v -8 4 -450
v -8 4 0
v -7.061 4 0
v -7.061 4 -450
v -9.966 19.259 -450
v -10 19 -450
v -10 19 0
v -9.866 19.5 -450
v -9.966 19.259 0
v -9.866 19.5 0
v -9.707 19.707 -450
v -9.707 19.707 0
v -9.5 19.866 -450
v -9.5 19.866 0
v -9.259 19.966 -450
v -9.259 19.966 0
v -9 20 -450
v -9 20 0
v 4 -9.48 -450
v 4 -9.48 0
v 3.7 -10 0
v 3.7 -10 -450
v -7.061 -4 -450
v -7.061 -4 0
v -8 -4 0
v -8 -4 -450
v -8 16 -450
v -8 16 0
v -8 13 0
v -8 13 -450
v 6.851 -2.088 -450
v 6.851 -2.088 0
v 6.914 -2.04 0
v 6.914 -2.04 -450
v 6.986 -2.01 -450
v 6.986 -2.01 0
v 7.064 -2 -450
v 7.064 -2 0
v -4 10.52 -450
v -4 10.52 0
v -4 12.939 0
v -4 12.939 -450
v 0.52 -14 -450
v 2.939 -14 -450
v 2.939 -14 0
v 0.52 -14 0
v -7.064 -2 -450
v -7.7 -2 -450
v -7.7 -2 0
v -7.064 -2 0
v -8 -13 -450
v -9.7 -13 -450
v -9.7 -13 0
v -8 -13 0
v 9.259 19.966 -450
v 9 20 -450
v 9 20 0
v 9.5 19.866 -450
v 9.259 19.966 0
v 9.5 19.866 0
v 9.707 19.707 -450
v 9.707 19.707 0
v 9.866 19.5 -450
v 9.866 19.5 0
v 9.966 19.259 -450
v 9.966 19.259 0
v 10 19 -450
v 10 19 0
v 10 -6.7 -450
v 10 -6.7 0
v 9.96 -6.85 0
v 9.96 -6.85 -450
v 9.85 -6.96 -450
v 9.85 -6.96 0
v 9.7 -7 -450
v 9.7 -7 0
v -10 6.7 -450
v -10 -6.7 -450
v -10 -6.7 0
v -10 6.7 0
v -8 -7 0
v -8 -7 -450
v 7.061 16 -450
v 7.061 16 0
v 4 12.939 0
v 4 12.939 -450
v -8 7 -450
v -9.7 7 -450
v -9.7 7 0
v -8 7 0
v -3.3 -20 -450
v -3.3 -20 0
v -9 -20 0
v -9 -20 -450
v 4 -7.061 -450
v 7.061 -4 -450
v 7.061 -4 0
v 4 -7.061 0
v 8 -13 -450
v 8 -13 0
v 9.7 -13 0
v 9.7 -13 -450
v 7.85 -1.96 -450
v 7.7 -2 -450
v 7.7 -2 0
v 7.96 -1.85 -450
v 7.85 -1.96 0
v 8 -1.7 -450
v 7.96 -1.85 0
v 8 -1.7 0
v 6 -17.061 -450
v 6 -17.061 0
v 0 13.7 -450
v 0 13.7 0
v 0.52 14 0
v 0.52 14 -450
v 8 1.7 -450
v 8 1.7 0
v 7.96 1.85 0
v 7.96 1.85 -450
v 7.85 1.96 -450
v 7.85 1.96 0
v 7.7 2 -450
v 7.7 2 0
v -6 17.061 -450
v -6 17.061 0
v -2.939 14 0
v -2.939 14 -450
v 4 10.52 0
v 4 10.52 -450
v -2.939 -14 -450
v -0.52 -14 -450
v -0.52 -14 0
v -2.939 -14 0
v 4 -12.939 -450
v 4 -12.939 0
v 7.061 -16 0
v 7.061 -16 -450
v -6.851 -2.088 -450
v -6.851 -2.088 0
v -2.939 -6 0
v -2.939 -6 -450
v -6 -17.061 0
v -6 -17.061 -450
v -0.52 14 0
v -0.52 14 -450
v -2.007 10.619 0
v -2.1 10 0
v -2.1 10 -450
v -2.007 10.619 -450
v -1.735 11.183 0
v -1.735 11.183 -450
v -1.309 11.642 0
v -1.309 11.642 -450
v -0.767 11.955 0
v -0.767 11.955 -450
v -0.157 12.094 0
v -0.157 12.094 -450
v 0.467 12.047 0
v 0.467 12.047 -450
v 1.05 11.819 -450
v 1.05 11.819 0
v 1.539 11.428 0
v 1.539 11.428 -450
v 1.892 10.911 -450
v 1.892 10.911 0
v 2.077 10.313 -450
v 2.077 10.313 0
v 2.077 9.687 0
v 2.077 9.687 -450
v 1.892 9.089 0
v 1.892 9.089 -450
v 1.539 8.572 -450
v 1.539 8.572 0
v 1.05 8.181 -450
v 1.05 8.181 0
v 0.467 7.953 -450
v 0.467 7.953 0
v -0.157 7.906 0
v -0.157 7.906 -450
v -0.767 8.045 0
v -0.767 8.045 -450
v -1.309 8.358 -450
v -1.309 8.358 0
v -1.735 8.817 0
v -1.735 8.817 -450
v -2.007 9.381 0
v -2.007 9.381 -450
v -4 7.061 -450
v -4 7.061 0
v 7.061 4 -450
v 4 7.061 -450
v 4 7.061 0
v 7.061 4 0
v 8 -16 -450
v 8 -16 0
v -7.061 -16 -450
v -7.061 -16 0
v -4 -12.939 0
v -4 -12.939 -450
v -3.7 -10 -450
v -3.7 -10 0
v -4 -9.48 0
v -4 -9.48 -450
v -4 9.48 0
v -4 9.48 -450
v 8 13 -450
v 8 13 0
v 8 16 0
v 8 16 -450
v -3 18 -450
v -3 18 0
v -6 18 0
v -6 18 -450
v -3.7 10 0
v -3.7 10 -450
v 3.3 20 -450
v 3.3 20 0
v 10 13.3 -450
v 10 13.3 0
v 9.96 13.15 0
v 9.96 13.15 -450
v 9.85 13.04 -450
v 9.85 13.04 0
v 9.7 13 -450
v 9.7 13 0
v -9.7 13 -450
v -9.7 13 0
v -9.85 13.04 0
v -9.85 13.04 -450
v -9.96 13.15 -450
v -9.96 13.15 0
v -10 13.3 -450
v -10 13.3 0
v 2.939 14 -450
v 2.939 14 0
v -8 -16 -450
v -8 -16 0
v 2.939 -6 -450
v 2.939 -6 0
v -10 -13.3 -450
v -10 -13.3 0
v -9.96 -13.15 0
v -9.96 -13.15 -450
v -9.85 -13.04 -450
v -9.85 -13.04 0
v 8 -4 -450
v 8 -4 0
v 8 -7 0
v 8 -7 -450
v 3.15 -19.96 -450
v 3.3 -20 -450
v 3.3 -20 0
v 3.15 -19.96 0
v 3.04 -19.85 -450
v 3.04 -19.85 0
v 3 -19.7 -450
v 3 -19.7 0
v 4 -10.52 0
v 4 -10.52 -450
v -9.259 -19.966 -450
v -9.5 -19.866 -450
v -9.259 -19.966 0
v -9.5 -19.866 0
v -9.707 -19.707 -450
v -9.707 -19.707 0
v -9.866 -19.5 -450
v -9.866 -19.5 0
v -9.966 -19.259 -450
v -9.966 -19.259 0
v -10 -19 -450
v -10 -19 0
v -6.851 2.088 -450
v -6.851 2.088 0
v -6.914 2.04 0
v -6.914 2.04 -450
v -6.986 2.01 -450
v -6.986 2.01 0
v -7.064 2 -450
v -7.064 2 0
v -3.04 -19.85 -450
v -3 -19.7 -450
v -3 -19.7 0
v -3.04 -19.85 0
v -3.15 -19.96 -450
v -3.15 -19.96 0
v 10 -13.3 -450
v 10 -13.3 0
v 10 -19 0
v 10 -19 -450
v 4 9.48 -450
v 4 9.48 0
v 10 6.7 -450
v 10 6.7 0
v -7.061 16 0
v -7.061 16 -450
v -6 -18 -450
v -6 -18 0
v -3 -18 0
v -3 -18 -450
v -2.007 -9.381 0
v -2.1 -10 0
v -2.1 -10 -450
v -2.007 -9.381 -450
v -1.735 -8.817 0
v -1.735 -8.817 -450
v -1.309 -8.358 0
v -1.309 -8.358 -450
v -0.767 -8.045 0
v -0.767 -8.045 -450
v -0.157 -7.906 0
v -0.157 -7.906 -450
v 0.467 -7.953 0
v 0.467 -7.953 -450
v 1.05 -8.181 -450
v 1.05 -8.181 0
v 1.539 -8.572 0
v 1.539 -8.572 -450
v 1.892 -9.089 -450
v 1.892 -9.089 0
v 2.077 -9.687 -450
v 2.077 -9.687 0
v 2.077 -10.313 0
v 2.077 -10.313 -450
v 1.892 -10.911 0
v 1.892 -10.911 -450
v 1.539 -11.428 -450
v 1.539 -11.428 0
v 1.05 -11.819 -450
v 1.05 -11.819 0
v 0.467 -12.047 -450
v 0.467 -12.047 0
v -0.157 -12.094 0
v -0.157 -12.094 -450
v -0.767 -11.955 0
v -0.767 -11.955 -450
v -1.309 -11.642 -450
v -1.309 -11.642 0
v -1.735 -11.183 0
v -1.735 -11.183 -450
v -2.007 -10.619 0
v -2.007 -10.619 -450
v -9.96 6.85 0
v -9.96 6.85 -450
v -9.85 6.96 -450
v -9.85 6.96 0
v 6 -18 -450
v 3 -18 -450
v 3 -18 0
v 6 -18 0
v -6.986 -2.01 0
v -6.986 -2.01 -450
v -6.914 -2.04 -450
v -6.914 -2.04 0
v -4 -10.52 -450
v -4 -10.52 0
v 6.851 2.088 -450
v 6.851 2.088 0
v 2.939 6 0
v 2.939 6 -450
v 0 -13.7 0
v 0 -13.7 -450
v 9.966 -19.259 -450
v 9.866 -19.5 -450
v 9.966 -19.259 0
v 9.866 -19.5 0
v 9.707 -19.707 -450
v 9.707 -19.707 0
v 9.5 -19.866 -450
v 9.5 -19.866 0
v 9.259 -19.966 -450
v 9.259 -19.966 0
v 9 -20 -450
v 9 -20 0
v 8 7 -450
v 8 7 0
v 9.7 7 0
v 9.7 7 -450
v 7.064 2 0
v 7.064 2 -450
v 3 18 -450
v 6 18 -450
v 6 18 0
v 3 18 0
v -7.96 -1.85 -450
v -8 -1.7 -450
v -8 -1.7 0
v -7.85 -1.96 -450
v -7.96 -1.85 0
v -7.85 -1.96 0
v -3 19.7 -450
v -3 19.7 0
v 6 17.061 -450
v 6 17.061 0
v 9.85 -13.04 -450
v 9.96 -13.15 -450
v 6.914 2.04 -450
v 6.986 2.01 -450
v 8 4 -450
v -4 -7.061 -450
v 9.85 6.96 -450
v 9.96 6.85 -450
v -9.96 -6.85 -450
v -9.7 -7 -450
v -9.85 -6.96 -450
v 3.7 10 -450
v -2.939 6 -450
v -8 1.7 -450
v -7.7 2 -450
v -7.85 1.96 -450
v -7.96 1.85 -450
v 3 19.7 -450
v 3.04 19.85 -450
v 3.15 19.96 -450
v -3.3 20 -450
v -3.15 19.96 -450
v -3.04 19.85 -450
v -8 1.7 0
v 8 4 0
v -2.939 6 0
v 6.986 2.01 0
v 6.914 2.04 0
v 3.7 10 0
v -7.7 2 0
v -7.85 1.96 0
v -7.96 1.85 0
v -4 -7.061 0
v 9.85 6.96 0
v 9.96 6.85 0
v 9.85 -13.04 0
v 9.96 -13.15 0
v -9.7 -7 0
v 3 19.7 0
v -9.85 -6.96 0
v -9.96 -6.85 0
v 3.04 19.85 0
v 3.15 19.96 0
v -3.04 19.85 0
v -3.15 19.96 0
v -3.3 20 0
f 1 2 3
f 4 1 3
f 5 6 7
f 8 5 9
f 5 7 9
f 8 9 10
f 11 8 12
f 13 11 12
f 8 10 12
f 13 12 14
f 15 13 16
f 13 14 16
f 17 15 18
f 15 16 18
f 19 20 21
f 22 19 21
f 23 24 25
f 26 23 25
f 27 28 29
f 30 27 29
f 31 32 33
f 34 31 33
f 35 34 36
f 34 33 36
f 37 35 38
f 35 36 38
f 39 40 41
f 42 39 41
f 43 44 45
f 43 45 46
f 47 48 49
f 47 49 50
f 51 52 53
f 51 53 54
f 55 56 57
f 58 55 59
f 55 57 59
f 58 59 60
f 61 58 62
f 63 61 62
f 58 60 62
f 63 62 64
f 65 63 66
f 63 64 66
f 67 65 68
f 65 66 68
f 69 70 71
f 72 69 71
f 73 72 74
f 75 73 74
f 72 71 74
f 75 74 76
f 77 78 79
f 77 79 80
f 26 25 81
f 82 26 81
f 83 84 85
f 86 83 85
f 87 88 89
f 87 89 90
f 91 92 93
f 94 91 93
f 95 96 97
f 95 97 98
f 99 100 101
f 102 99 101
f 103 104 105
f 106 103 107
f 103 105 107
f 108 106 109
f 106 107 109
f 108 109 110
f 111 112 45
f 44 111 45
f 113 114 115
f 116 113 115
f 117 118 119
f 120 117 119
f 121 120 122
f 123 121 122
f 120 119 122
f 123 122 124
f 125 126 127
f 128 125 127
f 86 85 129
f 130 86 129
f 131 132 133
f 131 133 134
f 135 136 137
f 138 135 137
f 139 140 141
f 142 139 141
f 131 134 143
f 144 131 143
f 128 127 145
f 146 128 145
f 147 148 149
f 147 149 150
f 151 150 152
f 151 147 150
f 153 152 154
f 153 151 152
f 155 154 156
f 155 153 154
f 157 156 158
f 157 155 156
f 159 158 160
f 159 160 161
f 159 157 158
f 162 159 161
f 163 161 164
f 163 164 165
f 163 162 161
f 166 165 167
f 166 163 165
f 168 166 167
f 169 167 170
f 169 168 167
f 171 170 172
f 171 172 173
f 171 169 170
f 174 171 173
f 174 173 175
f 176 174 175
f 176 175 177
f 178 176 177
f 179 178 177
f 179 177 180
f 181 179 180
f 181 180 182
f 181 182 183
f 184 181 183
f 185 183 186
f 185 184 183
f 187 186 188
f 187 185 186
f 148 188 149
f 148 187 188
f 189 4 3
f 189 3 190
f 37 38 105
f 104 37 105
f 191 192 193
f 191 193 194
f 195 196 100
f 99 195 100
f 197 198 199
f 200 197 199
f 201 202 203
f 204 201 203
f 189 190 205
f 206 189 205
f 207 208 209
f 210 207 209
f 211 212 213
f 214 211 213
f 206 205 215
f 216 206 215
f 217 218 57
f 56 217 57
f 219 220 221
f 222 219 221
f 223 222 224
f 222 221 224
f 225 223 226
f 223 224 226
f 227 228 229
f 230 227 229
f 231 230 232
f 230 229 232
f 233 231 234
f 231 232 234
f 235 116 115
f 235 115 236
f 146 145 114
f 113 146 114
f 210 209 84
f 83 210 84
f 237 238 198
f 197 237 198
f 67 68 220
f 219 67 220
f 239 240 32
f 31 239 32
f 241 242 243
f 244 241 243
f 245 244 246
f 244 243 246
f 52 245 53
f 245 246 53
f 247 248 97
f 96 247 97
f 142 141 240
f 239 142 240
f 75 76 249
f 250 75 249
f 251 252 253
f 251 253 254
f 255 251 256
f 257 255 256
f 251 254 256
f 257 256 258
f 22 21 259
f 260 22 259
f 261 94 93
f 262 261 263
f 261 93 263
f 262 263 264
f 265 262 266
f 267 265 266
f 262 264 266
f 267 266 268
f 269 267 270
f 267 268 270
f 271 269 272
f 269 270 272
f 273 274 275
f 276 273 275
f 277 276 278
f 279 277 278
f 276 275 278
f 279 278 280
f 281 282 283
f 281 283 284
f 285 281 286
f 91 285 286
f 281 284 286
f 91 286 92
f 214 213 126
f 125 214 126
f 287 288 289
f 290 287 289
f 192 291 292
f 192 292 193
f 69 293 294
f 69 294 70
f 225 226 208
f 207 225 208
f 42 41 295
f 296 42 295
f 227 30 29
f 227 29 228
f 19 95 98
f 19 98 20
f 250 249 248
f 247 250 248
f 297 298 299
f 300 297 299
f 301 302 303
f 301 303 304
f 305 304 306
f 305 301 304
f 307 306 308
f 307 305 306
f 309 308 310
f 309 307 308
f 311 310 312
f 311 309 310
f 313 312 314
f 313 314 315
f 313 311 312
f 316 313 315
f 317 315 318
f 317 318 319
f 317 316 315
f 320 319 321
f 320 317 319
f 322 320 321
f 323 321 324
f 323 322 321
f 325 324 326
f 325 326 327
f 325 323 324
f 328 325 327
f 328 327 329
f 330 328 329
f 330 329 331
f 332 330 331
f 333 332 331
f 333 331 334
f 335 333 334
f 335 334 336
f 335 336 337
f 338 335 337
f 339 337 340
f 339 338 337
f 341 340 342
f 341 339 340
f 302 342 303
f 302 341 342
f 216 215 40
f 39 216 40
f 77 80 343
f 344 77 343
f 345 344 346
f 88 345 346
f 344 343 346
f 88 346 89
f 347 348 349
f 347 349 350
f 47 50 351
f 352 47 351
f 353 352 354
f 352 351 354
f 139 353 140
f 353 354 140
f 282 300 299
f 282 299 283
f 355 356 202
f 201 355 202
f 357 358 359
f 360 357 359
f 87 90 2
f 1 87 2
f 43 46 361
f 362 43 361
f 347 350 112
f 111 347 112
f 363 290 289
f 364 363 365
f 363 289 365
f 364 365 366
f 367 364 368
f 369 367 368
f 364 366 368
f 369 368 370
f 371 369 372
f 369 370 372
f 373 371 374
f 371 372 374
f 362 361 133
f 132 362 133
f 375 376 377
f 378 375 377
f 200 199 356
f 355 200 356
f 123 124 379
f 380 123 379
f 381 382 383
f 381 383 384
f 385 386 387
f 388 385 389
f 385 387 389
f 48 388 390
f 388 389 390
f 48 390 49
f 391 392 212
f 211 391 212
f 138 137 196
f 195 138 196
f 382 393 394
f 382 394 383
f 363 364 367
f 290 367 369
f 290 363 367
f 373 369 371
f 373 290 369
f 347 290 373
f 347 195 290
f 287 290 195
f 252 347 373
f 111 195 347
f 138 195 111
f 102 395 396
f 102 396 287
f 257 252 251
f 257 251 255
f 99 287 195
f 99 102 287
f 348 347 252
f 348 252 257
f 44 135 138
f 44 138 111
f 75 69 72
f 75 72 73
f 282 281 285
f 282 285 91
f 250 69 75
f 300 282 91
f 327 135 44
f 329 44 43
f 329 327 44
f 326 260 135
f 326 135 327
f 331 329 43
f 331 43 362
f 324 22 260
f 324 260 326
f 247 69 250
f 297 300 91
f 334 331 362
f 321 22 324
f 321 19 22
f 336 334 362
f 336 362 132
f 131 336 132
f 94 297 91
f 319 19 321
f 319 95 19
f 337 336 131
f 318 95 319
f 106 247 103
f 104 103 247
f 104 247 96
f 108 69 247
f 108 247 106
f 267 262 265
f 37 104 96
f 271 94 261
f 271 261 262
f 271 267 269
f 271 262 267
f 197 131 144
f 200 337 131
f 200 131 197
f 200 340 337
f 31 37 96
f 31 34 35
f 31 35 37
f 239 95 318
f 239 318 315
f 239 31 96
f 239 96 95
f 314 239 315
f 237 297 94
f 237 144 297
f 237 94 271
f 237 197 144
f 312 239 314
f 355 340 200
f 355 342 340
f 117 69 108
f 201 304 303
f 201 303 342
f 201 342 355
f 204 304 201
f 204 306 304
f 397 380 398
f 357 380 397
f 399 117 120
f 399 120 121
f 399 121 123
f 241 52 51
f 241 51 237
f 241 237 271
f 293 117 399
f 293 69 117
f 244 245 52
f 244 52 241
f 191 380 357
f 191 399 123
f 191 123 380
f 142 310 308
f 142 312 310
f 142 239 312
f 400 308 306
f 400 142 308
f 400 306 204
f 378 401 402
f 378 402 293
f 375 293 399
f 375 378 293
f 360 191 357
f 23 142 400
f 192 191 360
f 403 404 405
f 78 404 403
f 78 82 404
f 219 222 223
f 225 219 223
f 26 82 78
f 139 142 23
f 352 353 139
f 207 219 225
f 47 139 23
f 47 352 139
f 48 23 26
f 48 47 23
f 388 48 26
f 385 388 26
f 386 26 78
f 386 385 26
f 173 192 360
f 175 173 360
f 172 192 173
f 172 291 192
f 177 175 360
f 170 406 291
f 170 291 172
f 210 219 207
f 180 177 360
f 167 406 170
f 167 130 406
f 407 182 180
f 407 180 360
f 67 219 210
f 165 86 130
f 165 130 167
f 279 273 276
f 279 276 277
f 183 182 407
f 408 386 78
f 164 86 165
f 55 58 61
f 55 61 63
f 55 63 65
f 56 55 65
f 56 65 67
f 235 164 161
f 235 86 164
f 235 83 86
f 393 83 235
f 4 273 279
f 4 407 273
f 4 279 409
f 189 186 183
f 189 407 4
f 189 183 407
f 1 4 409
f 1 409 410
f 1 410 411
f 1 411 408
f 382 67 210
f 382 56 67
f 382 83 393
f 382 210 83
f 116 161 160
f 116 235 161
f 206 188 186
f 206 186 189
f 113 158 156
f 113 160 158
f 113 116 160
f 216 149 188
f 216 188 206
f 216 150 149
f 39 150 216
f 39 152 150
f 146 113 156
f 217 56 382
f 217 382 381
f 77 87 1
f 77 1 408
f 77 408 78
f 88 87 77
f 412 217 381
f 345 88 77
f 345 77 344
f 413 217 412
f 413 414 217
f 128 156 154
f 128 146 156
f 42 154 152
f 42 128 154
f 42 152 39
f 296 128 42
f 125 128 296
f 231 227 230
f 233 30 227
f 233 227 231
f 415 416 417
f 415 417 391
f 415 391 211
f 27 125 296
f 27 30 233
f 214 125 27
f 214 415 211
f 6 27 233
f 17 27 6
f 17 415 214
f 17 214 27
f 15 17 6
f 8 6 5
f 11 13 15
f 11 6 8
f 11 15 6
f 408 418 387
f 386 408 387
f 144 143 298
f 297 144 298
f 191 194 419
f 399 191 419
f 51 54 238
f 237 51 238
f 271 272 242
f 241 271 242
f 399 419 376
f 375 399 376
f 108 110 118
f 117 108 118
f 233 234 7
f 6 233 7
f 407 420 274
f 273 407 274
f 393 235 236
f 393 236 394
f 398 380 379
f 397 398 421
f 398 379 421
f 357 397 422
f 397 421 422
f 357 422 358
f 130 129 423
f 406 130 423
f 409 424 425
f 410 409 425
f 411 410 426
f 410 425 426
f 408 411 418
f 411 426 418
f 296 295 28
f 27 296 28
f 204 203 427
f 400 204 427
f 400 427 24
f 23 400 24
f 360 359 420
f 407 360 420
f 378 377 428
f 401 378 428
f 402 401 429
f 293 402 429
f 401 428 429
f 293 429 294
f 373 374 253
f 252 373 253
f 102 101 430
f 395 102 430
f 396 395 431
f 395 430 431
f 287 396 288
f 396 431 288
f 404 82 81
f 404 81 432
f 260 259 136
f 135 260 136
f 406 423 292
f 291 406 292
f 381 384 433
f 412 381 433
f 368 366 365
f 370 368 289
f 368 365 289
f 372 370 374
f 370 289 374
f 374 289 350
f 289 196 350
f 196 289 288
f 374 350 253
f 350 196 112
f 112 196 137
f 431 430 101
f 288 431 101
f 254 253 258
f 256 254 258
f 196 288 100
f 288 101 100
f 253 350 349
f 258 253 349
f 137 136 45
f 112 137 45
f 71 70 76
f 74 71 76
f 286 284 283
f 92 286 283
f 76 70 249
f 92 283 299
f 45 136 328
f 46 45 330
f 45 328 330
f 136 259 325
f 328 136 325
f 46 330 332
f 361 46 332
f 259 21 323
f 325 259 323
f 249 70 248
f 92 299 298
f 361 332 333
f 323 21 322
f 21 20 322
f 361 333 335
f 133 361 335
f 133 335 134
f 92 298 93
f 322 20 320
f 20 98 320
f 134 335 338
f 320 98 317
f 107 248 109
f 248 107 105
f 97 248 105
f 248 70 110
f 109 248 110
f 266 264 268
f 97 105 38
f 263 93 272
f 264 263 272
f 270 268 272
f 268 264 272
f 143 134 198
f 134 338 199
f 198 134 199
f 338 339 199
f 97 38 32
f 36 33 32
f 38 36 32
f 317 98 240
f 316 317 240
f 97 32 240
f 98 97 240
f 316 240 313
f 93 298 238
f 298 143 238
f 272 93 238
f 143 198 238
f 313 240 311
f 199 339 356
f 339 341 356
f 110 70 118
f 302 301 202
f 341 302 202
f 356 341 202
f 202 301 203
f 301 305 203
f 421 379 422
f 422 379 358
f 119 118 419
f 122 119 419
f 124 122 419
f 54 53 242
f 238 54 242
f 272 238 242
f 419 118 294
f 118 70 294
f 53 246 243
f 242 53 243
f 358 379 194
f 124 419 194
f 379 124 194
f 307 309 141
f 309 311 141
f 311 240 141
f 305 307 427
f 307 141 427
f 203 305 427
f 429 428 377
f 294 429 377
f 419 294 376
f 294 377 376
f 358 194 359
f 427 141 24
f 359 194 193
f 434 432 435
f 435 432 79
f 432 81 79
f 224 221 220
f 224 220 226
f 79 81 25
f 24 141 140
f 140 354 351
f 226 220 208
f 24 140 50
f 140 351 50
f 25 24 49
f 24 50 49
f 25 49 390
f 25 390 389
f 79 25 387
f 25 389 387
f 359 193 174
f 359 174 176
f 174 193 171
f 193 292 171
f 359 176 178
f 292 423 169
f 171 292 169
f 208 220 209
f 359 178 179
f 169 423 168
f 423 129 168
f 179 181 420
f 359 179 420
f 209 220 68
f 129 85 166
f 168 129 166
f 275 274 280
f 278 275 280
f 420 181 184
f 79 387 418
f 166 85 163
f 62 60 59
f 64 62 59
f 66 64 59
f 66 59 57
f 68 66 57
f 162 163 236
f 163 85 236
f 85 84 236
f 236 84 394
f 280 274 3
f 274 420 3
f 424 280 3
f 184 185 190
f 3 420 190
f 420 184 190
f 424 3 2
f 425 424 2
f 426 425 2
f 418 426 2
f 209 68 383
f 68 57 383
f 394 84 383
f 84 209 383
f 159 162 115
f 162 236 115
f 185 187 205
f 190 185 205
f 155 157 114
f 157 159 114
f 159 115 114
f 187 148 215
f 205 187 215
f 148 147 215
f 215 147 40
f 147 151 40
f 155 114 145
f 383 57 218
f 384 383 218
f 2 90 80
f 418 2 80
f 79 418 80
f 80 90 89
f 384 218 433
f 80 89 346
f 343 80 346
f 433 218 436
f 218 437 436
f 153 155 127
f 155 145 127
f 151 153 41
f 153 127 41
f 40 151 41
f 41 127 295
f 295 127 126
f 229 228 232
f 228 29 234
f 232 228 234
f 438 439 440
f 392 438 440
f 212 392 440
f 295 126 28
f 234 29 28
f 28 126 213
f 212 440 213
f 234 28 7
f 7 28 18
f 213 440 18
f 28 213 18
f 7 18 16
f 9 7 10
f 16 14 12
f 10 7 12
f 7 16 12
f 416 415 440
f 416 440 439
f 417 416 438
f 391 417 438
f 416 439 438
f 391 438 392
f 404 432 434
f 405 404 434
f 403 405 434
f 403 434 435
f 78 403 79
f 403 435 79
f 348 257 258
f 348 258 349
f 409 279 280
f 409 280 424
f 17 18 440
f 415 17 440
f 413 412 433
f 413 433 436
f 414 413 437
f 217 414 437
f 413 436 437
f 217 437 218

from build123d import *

# Parameters (mm, degrees)
SKETCH1_R           = 2.0999999
BOSS_EXTRUDE1_DEPTH = 450


with BuildPart() as part:
    # Sketch1 → Boss-Extrude1 (new body)
    with BuildSketch(Plane(origin=(0, 0, 0), x_dir=(-1, 0, 0), z_dir=(0, 0, -1))):
        with BuildLine():
            Line((10, -19), (10, -13.3000005))
            ThreePointArc((10, -13.3000005), (9.912132034, -13.087868466), (9.7, -13.0000005))
            Line((9.7, -13.0000005), (7.999996324, -13.0000005))
            Line((7.999996324, -13.0000005), (7.999996324, -16.0000005))
            Line((7.999996324, -16.0000005), (7.0606365, -16.0000005))
            Line((7.0606365, -16.0000005), (4, -12.9393575))
            Line((4, -12.9393575), (4, -10.519615742))
            Line((4, -10.519615742), (3.7, -10.0000005))
            Line((3.7, -10.0000005), (4, -9.480385258))
            Line((4, -9.480385258), (4, -7.0606688))
            Line((4, -7.0606688), (7.06066257, -4.000000504))
            Line((7.06066257, -4.000000504), (7.999996324, -4.000000504))
            Line((7.999996324, -4.000000504), (7.999996324, -7.0000005))
            Line((7.999996324, -7.0000005), (9.7, -7.0000005))
            ThreePointArc((9.7, -7.0000005), (9.912132034, -6.912132534), (10, -6.7000005))
            Line((10, -6.7000005), (10, 6.7))
            ThreePointArc((10, 6.7), (9.912132034, 6.912132034), (9.7, 7))
            Line((9.7, 7), (7.999996324, 7))
            Line((7.999996324, 7), (7.999996324, 4))
            Line((7.999996324, 4), (7.060659, 4))
            Line((7.060659, 4), (4, 7.06066))
            Line((4, 7.06066), (4, 9.480384758))
            Line((4, 9.480384758), (3.7, 10))
            Line((3.7, 10), (4, 10.519615242))
            Line((4, 10.519615242), (4, 12.9393565))
            Line((4, 12.9393565), (7.060642, 16))
            Line((7.060642, 16), (7.999996324, 16))
            Line((7.999996324, 16), (7.999996324, 13))
            Line((7.999996324, 13), (9.7, 13))
            ThreePointArc((9.7, 13), (9.912132034, 13.087867966), (10, 13.3))
            Line((10, 13.3), (10, 19))
            ThreePointArc((10, 19), (9.707106781, 19.707106781), (9, 20))
            Line((9, 20), (3.3, 20))
            ThreePointArc((3.3, 20), (3.087867966, 19.912132034), (3, 19.7))
            Line((3, 19.7), (3, 17.999998284))
            Line((3, 17.999998284), (5.999998141, 17.999998284))
            Line((5.999998141, 17.999998284), (5.999998141, 17.060676141))
            Line((5.999998141, 17.060676141), (2.939333284, 13.999998284))
            Line((2.939333284, 13.999998284), (0.519636909, 13.999998284))
            Line((0.519636909, 13.999998284), (-1.716e-06, 13.699984784))
            Line((-1.716e-06, 13.699984784), (-0.519640341, 13.999998284))
            Line((-0.519640341, 13.999998284), (-2.939355716, 13.999998284))
            Line((-2.939355716, 13.999998284), (-6.000001716, 17.060658034))
            Line((-6.000001716, 17.060658034), (-6.000001716, 17.999998284))
            Line((-6.000001716, 17.999998284), (-3, 17.999998284))
            Line((-3, 17.999998284), (-3, 19.7))
            ThreePointArc((-3, 19.7), (-3.087867966, 19.912132034), (-3.3, 20))
            Line((-3.3, 20), (-9, 20))
            ThreePointArc((-9, 20), (-9.707106781, 19.707106781), (-10, 19))
            Line((-10, 19), (-10, 13.3))
            ThreePointArc((-10, 13.3), (-9.912132034, 13.087867966), (-9.7, 13))
            Line((-9.7, 13), (-8.000003676, 13))
            Line((-8.000003676, 13), (-8.000003676, 16))
            Line((-8.000003676, 16), (-7.060661, 16))
            Line((-7.060661, 16), (-4, 12.93933675))
            Line((-4, 12.93933675), (-4, 10.519615242))
            Line((-4, 10.519615242), (-3.7, 10))
            Line((-3.7, 10), (-4, 9.480384758))
            Line((-4, 9.480384758), (-4, 7.06068075))
            Line((-4, 7.06068075), (-7.060678, 4))
            Line((-7.060678, 4), (-8.000003676, 4))
            Line((-8.000003676, 4), (-8.000003676, 7))
            Line((-8.000003676, 7), (-9.7, 7))
            ThreePointArc((-9.7, 7), (-9.912132034, 6.912132034), (-10, 6.7))
            Line((-10, 6.7), (-10, -6.7000005))
            ThreePointArc((-10, -6.7000005), (-9.912132034, -6.912132534), (-9.7, -7.0000005))
            Line((-9.7, -7.0000005), (-8.000003676, -7.0000005))
            Line((-8.000003676, -7.0000005), (-8.000003676, -4.000000504))
            Line((-8.000003676, -4.000000504), (-7.06068236, -4.000000504))
            Line((-7.06068236, -4.000000504), (-4, -7.06068365))
            Line((-4, -7.06068365), (-4, -9.480385258))
            Line((-4, -9.480385258), (-3.7, -10.0000005))
            Line((-3.7, -10.0000005), (-4, -10.519615742))
            Line((-4, -10.519615742), (-4, -12.93934215))
            Line((-4, -12.93934215), (-7.06065685, -16.0000005))
            Line((-7.06065685, -16.0000005), (-8.000003676, -16.0000005))
            Line((-8.000003676, -16.0000005), (-8.000003676, -13.0000005))
            Line((-8.000003676, -13.0000005), (-9.7, -13.0000005))
            ThreePointArc((-9.7, -13.0000005), (-9.912132034, -13.087868466), (-10, -13.3000005))
            Line((-10, -13.3000005), (-10, -19))
            ThreePointArc((-10, -19), (-9.707106781, -19.707106781), (-9, -20))
            Line((-9, -20), (-3.3, -20))
            ThreePointArc((-3.3, -20), (-3.087867966, -19.912132034), (-3, -19.7))
            Line((-3, -19.7), (-3, -18.000001716))
            Line((-3, -18.000001716), (-6.000001716, -18.000001716))
            Line((-6.000001716, -18.000001716), (-6.000001716, -17.060664516))
            Line((-6.000001716, -17.060664516), (-2.939338216, -14.000001716))
            Line((-2.939338216, -14.000001716), (-0.519616958, -14.000001716))
            Line((-0.519616958, -14.000001716), (-1.716e-06, -13.700001716))
            Line((-1.716e-06, -13.700001716), (0.519613526, -14.000001716))
            Line((0.519613526, -14.000001716), (2.939316284, -14.000001716))
            Line((2.939316284, -14.000001716), (5.999998141, -17.060684359))
            Line((5.999998141, -17.060684359), (5.999998141, -18.000001716))
            Line((5.999998141, -18.000001716), (3, -18.000001716))
            Line((3, -18.000001716), (3, -19.7))
            ThreePointArc((3, -19.7), (3.087867966, -19.912132034), (3.3, -20))
            Line((3.3, -20), (9, -20))
            ThreePointArc((9, -20), (9.707106781, -19.707106781), (10, -19))
        make_face()
        with Locations((0, -10.0000005)):
            Circle(SKETCH1_R, mode=Mode.SUBTRACT)
        with Locations((0, 10)):
            Circle(SKETCH1_R, mode=Mode.SUBTRACT)
        with BuildLine():
            Line((7.999996324, 1.699995824), (7.999996324, -1.700003926))
            ThreePointArc((7.999996324, -1.700003926), (7.912128359, -1.91213596), (7.699996324, -2.000003926))
            Line((7.699996324, -2.000003926), (7.063600862, -2.000003926))
            ThreePointArc((7.063600862, -2.000003926), (6.94879664, -2.022827662), (6.85147763, -2.08786567))
            Line((6.85147763, -2.08786567), (2.939331324, -6.000003676))
            Line((2.939331324, -6.000003676), (-2.939335626, -6.000003676))
            Line((-2.939335626, -6.000003676), (-6.85148297, -2.087865332))
            ThreePointArc((-6.85148297, -2.087865332), (-6.948803597, -2.022827887), (-7.063608826, -2.000003926))
            Line((-7.063608826, -2.000003926), (-7.700003676, -2.000003926))
            ThreePointArc((-7.700003676, -2.000003926), (-7.91213571, -1.91213596), (-8.000003676, -1.700003926))
            Line((-8.000003676, -1.700003926), (-8.000003676, 1.699995824))
            ThreePointArc((-8.000003676, 1.699995824), (-7.91213571, 1.912127859), (-7.700003676, 1.999995824))
            Line((-7.700003676, 1.999995824), (-7.063603126, 1.999995824))
            ThreePointArc((-7.063603126, 1.999995824), (-6.948797876, 2.022820045), (-6.851477822, 2.087858478))
            Line((-6.851477822, 2.087858478), (-2.939339176, 5.999996324))
            Line((-2.939339176, 5.999996324), (2.939335324, 5.999996324))
            Line((2.939335324, 5.999996324), (6.85147158, 2.087857193))
            ThreePointArc((6.85147158, 2.087857193), (6.948790922, 2.02281871), (7.063595862, 1.999995824))
            Line((7.063595862, 1.999995824), (7.699996324, 1.999995824))
            ThreePointArc((7.699996324, 1.999995824), (7.912128359, 1.912127859), (7.999996324, 1.699995824))
        make_face(mode=Mode.SUBTRACT)
    extrude(amount=BOSS_EXTRUDE1_DEPTH)


solid = part.part
